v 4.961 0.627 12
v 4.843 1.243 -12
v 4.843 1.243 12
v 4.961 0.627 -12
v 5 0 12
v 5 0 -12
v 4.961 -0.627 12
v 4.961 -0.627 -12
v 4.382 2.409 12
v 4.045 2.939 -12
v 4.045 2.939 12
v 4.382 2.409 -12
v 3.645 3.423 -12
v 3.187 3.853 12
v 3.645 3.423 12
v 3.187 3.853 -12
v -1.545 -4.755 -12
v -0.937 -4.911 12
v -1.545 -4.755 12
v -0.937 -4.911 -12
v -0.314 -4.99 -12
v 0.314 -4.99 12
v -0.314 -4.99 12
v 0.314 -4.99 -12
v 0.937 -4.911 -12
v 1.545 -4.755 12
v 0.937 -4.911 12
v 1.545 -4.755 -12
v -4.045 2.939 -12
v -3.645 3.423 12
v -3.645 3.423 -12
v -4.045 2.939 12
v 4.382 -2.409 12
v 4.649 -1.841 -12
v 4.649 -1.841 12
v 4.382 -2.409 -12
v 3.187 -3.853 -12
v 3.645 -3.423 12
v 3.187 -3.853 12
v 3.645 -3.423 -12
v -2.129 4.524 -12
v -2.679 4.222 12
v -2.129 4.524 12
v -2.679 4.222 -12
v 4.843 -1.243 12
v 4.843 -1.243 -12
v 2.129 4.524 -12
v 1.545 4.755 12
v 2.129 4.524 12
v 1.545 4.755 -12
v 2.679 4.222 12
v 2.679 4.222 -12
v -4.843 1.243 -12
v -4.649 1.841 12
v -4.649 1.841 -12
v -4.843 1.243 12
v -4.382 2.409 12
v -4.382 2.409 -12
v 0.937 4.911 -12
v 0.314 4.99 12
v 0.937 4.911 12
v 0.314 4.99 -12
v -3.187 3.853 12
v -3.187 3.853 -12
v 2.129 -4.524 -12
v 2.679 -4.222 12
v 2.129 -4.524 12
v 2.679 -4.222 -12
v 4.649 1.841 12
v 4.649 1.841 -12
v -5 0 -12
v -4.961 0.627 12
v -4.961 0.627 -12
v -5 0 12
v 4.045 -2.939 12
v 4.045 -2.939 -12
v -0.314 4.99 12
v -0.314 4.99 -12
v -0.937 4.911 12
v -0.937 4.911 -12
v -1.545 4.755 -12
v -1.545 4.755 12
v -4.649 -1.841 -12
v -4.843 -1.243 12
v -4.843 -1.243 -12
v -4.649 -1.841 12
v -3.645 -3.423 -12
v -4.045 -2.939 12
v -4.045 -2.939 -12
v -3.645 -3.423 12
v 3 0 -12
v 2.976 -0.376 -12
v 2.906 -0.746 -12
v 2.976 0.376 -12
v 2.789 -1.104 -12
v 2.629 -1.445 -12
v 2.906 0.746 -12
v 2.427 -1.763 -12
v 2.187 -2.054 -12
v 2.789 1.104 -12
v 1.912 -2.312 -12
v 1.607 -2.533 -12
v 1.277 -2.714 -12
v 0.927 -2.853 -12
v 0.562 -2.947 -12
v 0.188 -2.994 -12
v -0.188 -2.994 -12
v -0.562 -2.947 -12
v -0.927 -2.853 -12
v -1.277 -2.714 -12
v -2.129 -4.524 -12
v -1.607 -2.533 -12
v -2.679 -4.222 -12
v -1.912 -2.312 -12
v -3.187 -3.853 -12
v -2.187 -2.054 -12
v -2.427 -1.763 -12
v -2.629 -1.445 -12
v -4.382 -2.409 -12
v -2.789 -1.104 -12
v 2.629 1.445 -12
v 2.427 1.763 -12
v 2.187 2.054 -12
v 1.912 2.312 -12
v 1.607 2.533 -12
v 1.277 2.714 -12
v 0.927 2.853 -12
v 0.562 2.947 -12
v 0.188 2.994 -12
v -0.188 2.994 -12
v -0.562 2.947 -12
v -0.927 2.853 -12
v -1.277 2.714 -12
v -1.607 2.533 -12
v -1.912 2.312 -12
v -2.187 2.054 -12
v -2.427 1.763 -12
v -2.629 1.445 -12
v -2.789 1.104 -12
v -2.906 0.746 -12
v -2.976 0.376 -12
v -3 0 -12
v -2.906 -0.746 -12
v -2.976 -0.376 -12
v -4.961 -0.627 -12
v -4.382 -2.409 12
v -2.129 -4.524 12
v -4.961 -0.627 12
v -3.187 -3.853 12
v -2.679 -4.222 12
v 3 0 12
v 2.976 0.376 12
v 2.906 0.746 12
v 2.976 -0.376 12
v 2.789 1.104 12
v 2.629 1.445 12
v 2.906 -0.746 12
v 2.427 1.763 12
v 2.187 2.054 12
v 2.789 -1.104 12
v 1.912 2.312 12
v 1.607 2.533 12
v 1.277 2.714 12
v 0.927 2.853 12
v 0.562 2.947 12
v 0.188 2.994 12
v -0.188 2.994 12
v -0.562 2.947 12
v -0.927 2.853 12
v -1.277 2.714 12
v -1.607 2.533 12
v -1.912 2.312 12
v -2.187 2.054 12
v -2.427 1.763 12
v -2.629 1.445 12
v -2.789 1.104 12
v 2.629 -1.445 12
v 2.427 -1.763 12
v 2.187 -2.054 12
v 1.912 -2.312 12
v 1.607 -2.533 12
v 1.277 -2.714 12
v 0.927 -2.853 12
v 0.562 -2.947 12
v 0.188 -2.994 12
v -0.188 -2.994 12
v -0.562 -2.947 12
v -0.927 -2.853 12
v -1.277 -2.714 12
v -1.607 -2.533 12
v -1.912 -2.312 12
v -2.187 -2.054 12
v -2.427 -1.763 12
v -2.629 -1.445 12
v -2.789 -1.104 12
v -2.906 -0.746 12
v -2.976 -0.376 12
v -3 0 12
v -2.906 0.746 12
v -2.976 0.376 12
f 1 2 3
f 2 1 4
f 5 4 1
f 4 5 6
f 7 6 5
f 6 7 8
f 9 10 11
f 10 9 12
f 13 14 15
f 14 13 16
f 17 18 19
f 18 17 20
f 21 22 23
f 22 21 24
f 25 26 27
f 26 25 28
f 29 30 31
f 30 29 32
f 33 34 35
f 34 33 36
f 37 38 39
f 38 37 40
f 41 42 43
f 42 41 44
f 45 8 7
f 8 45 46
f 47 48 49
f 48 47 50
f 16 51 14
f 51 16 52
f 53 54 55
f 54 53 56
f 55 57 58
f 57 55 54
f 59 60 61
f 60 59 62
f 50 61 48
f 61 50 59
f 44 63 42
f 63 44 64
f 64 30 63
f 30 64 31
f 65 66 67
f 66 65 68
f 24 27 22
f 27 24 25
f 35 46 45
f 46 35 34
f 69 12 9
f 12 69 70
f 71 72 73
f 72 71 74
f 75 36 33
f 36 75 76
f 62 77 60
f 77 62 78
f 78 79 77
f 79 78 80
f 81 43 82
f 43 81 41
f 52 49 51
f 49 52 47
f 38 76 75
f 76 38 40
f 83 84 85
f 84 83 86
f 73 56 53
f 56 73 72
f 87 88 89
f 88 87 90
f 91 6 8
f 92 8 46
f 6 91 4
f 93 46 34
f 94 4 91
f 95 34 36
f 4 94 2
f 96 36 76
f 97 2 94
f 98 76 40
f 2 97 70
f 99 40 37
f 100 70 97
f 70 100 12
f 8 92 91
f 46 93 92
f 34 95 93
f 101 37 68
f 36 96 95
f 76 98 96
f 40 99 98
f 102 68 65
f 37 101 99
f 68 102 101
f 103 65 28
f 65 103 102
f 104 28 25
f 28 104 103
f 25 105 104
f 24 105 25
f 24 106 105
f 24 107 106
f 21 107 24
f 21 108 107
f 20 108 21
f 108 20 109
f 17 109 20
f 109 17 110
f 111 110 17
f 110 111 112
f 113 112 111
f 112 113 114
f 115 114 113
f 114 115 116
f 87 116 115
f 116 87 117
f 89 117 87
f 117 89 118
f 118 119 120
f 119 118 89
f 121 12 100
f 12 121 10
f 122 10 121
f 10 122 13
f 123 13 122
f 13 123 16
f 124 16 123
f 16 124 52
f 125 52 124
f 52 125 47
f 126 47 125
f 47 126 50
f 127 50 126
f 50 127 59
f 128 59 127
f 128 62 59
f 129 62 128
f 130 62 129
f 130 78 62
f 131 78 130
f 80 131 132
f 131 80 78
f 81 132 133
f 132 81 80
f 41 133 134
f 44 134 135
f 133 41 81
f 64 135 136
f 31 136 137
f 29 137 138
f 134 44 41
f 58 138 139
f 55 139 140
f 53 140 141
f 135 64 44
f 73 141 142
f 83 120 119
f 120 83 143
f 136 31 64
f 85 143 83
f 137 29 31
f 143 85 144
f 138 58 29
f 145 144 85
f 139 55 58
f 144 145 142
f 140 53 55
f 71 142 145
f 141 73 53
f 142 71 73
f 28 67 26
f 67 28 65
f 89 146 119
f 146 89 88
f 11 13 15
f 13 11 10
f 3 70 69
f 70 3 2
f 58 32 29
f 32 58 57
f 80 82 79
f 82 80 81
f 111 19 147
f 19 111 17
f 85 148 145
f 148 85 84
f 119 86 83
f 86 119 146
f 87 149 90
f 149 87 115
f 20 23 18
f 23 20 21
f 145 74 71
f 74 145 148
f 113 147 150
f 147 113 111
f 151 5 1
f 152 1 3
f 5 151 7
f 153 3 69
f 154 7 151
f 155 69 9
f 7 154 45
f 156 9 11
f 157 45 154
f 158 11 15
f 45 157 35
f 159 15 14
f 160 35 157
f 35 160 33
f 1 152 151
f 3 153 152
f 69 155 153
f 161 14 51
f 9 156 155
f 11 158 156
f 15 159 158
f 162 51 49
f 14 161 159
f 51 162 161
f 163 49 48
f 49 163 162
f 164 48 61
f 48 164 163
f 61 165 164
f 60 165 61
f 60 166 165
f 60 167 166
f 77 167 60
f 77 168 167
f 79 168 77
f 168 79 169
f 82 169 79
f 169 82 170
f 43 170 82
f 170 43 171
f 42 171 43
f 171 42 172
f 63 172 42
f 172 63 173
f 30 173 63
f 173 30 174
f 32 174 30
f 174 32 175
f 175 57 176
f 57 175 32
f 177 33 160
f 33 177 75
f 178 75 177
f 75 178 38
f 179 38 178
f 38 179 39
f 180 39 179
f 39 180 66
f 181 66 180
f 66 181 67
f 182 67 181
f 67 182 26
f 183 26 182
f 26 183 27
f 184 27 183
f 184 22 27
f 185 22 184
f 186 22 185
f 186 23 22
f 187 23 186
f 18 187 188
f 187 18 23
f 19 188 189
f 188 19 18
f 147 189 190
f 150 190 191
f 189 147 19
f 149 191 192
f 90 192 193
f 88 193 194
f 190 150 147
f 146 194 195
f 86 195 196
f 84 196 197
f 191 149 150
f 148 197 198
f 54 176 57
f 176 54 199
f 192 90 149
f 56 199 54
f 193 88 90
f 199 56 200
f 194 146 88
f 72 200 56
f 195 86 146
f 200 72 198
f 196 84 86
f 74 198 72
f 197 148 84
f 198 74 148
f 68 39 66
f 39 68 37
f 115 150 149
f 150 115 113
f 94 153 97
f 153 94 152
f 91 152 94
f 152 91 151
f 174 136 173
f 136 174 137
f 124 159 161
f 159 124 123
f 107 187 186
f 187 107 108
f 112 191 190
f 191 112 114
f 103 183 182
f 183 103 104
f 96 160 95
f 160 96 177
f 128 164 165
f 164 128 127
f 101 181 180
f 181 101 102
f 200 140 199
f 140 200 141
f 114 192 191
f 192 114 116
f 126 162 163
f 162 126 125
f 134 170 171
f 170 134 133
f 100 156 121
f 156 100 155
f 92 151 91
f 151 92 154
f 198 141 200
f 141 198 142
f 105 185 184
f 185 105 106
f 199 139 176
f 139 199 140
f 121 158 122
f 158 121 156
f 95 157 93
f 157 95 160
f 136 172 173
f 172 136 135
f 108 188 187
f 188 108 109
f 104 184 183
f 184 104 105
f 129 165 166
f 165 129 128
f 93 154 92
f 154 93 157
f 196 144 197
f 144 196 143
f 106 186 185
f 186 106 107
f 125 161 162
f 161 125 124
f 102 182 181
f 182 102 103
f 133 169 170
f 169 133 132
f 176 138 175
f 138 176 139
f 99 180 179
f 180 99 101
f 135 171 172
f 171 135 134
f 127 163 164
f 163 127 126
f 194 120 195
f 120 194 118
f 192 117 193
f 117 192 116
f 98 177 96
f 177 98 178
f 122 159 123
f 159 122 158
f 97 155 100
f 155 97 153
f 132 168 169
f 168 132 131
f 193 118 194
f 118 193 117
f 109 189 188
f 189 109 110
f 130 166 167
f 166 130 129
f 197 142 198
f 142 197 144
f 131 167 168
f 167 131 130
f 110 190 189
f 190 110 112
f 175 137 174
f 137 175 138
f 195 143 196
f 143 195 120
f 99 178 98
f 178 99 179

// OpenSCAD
$fn = 50;


difference() {
	union() {
		translate(v = [0, 0, -12.0000000000]) {
			cylinder(h = 24, r = 5.0000000000);
		}
	}
	union() {
		translate(v = [0, 0, -100.0000000000]) {
			cylinder(h = 200, r = 3.0000000000);
		}
	}
}
